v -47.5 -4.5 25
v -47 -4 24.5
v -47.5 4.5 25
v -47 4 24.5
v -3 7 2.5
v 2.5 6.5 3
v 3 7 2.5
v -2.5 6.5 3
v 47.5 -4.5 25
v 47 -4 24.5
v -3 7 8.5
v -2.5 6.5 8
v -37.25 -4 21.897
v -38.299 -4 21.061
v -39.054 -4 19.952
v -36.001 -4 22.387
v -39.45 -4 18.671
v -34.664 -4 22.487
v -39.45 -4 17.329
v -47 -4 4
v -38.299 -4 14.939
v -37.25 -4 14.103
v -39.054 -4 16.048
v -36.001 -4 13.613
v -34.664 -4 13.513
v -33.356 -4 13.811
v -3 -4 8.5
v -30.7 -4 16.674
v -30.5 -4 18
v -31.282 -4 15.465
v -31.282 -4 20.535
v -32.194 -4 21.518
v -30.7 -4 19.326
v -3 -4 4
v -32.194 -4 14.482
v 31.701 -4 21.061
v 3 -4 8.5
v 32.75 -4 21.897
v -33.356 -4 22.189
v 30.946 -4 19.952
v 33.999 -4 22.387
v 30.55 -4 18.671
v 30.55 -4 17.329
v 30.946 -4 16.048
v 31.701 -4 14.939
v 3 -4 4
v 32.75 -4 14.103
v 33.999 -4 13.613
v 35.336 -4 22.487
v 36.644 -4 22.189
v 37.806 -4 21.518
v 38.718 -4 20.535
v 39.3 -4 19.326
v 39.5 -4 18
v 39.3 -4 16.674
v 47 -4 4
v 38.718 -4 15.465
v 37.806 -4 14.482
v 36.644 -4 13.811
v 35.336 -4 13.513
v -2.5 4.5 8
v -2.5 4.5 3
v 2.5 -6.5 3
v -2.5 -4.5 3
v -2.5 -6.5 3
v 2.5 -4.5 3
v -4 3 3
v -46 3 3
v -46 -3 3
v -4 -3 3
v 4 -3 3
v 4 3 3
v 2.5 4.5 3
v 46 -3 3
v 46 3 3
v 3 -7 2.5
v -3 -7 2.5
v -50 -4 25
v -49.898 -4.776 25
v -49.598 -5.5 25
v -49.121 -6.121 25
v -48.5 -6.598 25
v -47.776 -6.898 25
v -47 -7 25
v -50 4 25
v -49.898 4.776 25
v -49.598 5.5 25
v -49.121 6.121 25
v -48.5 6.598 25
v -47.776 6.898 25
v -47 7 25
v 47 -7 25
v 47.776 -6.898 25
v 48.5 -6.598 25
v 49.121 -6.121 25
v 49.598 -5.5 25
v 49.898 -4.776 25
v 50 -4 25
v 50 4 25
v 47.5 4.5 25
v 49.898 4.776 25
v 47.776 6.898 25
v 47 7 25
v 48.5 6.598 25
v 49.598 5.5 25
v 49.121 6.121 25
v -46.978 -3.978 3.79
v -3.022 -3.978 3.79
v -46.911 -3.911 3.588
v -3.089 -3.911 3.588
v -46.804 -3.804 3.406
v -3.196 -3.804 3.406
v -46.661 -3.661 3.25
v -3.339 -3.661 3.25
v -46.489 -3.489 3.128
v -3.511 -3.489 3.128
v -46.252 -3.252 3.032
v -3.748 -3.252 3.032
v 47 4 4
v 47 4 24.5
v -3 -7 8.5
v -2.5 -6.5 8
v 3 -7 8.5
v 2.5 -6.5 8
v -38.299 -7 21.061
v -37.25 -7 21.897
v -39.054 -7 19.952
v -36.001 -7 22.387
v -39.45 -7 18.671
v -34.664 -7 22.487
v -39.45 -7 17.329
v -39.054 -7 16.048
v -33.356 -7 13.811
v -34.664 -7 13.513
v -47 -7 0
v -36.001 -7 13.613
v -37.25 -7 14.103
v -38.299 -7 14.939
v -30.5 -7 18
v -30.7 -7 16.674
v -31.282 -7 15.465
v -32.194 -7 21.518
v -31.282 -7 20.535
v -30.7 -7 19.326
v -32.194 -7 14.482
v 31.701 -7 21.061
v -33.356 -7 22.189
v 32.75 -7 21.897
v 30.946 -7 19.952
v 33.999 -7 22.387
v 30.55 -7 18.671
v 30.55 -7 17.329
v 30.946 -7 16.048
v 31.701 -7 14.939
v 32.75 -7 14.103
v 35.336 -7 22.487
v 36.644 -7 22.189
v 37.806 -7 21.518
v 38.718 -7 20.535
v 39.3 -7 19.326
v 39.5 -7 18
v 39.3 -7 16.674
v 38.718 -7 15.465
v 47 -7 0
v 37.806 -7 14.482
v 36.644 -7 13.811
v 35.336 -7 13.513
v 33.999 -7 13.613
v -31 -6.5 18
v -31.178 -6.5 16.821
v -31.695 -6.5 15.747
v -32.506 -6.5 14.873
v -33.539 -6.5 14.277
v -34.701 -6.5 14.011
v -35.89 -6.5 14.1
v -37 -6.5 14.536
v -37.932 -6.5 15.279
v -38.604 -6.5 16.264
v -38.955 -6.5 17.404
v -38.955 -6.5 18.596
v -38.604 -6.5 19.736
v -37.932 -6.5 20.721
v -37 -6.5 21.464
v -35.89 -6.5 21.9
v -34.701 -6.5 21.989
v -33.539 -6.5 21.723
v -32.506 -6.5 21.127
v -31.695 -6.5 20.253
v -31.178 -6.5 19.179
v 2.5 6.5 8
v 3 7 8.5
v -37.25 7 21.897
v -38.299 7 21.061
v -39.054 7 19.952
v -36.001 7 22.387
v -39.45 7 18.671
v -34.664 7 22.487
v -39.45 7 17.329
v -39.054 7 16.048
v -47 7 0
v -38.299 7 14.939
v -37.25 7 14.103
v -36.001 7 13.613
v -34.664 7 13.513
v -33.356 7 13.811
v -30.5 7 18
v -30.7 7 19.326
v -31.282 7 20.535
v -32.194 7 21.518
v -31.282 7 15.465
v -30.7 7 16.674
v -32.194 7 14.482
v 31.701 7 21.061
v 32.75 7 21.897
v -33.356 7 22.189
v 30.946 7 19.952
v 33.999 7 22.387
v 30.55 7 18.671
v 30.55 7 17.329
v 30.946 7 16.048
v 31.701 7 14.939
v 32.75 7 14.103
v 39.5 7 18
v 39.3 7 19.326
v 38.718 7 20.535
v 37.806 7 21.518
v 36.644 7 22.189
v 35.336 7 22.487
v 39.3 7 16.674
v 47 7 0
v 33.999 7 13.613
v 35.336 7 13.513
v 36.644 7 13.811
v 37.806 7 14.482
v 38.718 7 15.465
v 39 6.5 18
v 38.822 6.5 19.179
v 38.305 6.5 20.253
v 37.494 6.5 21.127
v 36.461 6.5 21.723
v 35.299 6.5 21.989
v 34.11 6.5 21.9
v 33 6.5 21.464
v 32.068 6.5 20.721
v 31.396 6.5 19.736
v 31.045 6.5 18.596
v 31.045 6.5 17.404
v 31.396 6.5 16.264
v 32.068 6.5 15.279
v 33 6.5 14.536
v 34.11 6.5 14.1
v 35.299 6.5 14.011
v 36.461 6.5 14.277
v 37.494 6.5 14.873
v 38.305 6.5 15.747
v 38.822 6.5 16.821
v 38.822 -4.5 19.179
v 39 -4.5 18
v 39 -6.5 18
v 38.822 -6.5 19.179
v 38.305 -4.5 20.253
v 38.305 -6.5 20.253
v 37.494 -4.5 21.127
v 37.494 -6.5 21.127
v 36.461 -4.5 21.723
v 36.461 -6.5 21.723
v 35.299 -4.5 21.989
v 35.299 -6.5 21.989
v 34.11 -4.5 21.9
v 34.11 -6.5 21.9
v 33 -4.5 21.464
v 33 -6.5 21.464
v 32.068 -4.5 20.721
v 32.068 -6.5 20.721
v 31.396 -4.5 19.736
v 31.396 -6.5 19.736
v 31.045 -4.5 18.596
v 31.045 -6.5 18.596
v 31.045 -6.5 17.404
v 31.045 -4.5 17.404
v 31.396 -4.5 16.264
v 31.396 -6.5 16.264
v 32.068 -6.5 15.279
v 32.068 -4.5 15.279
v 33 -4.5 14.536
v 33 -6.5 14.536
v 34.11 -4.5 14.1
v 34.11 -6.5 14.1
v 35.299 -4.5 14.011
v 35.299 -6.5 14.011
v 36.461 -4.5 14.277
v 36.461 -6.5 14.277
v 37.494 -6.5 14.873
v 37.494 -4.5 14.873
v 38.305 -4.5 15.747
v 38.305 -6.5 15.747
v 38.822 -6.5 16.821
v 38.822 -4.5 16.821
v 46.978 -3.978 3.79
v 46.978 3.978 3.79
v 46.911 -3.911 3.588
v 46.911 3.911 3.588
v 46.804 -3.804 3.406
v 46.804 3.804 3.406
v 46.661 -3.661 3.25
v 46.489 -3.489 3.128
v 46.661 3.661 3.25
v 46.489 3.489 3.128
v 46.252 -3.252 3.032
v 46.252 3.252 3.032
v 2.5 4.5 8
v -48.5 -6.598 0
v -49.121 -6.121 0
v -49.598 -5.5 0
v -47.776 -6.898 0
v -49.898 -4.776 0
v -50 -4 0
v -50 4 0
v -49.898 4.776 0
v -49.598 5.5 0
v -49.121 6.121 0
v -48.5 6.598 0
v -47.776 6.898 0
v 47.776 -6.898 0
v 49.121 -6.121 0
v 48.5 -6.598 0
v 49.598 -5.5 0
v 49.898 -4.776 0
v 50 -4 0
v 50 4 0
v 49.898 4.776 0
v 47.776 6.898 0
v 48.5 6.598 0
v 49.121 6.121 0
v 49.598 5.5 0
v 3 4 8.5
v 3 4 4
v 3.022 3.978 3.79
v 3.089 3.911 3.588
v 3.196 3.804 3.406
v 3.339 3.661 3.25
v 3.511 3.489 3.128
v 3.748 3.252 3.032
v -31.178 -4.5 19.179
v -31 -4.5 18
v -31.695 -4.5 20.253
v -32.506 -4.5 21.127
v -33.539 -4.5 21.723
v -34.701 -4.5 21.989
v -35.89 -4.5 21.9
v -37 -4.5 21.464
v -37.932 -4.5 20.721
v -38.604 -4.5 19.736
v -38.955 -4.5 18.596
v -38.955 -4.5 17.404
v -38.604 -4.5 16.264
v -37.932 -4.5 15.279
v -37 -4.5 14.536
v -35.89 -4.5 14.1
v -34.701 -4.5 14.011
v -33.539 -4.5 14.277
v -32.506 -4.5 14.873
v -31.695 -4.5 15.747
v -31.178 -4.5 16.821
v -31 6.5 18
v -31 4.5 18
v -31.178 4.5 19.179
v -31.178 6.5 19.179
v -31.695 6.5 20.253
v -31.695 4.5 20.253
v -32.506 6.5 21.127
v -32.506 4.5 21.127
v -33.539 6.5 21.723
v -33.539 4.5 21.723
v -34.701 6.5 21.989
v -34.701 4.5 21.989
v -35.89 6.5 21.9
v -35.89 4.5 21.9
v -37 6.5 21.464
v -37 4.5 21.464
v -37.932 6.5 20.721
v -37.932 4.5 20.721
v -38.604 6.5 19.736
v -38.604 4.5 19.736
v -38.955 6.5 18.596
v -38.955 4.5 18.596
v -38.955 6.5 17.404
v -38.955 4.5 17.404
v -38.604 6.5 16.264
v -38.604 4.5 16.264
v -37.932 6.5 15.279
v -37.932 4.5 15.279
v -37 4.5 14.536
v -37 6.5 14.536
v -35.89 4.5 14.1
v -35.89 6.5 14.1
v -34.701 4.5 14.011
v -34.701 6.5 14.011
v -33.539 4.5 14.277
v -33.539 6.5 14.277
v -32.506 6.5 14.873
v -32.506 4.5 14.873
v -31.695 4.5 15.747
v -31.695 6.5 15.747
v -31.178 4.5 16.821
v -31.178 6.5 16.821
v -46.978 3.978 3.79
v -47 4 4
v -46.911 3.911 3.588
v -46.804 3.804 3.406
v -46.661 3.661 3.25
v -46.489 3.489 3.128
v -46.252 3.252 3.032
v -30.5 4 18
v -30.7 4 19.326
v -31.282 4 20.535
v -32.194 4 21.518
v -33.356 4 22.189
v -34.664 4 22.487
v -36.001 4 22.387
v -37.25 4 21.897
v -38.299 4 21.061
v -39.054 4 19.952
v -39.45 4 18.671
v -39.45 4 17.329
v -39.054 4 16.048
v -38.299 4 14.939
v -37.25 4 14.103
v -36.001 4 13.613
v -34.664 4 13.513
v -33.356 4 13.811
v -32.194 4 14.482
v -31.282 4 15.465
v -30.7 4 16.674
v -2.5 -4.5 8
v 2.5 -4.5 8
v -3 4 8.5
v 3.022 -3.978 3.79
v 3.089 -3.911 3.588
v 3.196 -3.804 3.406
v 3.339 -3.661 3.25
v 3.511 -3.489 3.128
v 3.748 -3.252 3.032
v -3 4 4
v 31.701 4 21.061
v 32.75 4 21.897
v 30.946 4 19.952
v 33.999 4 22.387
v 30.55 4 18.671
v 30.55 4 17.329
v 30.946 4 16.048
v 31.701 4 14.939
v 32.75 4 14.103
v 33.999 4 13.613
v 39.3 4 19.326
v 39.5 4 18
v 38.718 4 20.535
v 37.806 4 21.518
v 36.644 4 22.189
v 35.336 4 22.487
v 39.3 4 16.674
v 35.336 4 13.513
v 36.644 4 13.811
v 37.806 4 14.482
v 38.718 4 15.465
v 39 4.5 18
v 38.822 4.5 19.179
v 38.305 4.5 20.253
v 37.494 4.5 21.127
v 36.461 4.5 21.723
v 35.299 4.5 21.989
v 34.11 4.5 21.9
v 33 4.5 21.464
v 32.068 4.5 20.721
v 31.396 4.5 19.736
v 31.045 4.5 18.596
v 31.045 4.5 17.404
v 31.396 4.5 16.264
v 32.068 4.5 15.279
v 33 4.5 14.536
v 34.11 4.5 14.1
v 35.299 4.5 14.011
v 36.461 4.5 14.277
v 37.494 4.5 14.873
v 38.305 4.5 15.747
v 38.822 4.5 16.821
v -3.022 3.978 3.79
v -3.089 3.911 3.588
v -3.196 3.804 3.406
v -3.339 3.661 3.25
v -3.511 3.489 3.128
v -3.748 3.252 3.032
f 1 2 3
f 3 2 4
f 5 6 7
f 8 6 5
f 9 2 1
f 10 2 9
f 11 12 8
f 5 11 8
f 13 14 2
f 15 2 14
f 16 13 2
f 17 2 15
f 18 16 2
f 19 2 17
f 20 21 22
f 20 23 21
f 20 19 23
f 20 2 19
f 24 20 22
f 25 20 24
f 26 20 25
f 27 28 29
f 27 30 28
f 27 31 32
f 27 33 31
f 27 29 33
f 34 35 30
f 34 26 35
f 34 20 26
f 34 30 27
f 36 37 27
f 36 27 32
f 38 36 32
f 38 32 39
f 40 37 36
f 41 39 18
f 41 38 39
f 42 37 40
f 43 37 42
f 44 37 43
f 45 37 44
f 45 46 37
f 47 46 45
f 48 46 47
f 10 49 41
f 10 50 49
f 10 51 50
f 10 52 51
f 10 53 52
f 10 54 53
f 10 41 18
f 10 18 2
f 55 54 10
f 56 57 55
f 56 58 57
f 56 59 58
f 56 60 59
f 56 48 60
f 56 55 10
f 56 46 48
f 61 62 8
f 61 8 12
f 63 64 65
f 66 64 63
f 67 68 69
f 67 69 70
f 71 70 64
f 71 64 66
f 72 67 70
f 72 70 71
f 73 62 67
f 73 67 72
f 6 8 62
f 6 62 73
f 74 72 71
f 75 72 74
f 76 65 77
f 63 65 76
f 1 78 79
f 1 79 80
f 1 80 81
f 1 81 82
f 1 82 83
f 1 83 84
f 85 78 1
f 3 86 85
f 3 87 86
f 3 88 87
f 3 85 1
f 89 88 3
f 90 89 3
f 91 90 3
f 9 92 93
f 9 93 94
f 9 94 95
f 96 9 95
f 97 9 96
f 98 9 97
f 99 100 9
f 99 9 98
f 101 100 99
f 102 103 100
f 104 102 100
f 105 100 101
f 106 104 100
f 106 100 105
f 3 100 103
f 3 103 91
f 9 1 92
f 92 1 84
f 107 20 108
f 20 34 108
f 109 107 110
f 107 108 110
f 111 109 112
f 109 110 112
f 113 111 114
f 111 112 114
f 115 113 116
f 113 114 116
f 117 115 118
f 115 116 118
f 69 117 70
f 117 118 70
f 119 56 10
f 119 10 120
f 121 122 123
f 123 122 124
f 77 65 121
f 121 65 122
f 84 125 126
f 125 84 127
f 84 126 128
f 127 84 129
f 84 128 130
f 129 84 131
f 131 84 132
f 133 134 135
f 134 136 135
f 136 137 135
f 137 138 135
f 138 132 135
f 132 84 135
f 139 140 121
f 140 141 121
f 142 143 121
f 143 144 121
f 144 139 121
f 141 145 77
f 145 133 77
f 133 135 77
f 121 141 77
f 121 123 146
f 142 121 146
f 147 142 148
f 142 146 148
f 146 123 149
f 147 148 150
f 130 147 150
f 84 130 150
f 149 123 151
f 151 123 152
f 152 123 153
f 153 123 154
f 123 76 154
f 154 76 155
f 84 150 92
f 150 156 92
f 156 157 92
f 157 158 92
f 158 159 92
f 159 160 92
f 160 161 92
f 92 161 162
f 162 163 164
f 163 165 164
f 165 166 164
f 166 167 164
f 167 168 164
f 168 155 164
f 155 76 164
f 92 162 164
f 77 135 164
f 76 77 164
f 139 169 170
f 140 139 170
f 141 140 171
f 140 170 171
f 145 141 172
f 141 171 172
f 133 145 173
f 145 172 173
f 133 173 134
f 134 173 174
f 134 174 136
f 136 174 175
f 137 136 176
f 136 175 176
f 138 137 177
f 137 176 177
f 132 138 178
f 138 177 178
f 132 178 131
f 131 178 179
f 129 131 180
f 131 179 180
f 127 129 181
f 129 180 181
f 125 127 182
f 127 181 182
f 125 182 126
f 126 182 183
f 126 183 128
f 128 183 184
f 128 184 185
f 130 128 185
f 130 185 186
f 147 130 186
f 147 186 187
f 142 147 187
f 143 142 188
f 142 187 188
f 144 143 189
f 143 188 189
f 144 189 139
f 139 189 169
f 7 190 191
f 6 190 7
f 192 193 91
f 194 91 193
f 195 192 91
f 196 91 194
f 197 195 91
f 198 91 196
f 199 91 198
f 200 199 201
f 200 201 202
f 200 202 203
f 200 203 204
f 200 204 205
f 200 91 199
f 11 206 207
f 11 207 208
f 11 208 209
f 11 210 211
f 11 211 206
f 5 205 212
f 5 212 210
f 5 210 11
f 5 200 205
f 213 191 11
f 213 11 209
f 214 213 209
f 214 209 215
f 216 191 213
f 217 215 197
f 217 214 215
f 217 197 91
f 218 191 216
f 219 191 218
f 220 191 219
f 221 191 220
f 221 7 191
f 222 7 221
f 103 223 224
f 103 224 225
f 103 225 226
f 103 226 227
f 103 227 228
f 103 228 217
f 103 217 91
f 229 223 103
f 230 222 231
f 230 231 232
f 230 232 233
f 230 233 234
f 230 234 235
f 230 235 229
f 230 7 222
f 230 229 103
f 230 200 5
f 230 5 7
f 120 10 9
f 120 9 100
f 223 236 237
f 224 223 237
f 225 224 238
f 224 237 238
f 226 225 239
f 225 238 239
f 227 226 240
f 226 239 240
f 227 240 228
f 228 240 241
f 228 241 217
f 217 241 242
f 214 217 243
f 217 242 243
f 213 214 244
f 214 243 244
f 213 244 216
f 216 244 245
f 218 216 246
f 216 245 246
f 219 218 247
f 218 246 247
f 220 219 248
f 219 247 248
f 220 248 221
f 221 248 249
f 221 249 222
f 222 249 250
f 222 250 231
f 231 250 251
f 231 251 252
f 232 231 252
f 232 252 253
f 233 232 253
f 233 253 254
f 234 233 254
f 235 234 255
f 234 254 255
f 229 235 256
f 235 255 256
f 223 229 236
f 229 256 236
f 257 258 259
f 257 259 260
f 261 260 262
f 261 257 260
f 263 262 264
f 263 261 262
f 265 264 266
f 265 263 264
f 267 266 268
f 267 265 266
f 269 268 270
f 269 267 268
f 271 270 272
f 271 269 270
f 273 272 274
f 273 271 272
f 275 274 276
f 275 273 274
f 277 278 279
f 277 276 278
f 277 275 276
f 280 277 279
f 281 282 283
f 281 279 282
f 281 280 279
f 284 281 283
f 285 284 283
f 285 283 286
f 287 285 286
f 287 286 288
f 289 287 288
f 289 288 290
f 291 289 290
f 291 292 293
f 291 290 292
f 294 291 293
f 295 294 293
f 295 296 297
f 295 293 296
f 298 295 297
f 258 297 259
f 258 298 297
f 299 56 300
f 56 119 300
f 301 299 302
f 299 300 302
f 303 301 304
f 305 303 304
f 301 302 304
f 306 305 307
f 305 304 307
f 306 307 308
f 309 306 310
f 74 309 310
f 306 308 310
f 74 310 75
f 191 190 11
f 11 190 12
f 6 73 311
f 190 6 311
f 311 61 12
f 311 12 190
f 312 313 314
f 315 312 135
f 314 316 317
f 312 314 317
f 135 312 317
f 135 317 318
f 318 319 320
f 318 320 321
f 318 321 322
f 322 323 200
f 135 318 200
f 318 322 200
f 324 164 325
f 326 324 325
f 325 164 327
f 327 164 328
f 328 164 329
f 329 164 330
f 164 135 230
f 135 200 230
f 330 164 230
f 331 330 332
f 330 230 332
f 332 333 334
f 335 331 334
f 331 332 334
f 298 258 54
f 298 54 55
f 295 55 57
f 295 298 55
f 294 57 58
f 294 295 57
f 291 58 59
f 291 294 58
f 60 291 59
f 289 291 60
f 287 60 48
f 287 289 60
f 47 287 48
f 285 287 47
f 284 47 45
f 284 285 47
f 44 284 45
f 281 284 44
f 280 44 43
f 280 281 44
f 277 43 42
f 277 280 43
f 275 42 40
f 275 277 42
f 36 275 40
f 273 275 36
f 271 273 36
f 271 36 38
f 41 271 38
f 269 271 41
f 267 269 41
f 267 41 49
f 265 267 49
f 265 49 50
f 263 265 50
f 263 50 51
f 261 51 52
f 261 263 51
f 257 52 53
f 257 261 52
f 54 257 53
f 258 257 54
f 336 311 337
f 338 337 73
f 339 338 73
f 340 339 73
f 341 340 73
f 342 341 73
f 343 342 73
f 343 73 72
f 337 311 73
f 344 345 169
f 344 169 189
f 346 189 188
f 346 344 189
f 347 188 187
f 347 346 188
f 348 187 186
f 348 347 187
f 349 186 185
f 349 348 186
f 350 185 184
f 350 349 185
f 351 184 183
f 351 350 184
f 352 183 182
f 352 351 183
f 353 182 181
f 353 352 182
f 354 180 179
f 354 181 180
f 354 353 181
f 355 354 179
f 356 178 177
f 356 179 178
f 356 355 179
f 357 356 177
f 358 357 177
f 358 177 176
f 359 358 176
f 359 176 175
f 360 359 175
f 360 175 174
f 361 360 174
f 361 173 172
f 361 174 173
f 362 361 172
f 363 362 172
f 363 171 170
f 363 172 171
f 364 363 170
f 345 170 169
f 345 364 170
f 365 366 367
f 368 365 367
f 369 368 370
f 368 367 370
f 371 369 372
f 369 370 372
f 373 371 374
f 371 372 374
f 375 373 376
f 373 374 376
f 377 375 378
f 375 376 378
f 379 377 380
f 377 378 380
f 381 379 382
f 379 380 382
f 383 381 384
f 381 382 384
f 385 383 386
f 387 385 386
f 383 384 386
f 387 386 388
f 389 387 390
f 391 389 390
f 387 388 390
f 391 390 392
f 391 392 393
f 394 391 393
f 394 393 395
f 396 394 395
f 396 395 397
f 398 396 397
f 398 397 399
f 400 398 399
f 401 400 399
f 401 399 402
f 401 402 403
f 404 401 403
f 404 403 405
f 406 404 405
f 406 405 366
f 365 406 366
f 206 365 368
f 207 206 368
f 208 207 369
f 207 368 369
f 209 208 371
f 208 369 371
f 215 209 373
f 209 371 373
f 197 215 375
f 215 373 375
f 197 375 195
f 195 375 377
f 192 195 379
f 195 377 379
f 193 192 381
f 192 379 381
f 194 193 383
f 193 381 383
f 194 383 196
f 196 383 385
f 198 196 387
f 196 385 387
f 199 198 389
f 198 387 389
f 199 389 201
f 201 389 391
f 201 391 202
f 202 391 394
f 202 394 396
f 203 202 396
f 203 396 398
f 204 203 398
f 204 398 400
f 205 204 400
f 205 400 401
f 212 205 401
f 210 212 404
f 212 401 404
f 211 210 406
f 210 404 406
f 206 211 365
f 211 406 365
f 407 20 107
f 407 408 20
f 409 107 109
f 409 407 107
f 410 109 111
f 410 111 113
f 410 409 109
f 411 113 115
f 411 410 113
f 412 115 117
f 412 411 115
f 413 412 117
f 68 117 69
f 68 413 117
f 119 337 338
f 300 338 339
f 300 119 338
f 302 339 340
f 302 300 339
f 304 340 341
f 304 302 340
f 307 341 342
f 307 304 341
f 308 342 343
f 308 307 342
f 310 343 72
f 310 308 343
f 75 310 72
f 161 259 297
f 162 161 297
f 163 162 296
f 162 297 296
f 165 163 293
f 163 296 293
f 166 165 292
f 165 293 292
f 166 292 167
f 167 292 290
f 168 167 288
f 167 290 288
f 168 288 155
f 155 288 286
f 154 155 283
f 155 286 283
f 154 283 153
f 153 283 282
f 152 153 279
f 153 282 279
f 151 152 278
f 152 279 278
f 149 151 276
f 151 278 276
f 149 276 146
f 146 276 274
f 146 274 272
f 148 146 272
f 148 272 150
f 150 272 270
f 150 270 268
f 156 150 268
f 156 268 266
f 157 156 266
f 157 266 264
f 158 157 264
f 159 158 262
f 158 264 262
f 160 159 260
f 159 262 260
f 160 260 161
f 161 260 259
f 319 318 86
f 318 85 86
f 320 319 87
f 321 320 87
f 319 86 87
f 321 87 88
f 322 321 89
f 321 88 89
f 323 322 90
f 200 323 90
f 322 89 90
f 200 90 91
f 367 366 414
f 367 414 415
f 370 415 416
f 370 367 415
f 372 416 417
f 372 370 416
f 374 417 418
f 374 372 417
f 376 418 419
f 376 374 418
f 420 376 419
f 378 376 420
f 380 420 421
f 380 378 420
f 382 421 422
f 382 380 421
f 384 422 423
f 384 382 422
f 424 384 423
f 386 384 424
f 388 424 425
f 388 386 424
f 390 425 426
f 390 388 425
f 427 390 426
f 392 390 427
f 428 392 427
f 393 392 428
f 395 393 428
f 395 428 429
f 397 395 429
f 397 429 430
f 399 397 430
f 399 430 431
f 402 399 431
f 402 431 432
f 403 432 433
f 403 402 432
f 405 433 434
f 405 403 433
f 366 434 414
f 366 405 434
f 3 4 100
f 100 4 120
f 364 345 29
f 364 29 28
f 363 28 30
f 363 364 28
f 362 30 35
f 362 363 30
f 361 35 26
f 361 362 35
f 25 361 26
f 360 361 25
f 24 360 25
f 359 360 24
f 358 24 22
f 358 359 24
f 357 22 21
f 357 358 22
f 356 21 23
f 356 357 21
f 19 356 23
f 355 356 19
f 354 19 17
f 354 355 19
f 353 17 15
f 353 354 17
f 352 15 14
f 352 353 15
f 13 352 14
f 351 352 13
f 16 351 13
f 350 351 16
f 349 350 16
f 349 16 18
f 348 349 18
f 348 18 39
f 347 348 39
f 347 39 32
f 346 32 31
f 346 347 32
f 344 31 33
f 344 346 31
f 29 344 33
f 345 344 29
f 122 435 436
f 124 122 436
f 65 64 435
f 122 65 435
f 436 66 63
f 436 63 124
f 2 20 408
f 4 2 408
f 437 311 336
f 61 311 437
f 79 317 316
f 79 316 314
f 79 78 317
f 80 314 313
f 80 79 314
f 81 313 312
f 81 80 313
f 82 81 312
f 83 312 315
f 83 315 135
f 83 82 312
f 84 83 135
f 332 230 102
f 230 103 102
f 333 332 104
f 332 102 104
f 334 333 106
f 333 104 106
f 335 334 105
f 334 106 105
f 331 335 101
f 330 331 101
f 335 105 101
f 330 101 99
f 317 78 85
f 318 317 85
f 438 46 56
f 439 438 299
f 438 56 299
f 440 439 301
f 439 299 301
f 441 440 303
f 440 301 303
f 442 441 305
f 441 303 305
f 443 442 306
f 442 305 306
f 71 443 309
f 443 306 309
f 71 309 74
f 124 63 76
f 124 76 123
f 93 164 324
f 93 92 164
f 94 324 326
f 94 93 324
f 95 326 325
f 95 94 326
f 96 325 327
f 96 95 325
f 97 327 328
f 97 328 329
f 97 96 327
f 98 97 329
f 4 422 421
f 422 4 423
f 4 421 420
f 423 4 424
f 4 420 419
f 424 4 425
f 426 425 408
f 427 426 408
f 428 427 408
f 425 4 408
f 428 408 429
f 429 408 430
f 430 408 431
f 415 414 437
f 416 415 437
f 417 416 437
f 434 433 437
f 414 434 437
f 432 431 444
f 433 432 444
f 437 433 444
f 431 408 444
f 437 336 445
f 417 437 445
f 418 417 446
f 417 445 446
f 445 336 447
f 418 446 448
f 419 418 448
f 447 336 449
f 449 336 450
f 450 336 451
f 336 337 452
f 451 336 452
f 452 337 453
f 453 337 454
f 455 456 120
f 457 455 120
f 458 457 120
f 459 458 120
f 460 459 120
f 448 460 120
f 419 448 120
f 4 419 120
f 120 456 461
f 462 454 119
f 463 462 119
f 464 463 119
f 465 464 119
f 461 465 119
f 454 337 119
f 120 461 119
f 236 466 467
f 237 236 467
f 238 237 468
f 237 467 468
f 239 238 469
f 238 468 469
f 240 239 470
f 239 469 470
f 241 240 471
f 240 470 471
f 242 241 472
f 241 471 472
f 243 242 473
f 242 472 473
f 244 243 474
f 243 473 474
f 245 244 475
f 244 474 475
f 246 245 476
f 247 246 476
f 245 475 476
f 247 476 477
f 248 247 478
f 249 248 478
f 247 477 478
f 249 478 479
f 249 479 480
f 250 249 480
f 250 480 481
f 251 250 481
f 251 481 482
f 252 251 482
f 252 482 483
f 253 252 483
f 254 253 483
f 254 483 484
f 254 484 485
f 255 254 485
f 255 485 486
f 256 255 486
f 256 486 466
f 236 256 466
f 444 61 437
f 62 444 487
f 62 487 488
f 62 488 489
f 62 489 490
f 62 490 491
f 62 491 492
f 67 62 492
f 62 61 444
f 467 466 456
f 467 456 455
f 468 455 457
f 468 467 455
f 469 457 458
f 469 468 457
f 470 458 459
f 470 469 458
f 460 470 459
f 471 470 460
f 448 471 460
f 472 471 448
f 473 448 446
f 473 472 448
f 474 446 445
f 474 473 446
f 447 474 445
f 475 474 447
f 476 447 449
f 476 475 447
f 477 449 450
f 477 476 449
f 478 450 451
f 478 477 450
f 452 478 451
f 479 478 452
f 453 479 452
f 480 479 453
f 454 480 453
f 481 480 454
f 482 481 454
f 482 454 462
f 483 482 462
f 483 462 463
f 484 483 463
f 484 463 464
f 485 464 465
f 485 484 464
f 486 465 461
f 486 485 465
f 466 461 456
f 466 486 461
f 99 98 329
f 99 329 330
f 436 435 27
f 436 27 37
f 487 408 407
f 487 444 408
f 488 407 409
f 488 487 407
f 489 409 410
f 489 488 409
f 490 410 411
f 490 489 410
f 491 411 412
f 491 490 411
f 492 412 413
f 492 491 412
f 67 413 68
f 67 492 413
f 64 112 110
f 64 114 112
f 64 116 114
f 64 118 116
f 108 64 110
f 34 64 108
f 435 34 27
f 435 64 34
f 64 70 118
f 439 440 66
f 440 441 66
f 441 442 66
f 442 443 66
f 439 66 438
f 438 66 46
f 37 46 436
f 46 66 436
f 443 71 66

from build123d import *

# Parameters (mm, degrees)
F0_W          = 100
F0_H          = 14
F1_DEPTH      = 25
F2_T          = -3
F3_R          = 4
F3_W          = 5
F3_H          = 5
F4_DEPTH      = 7.001
F4_DEPTH_BACK = 7.001
F5_R          = 3
F6_SIZE       = 0.5
F7_R          = 1


with BuildPart() as f1:
    # F0 (on Top) → F1 (new body)
    with BuildSketch(Plane.XY):
        Rectangle(F0_W, F0_H)
    extrude(amount=F1_DEPTH)

    # F2
    f2_openings = [f1.faces().sort_by_distance(p)[0] for p in [
        (0, 0, 25),
    ]]
    offset(amount=F2_T, openings=f2_openings)

    # F3 (on Front) → F4 (cut, two sides)
    with BuildSketch(Plane.XZ) as f4_sk:
        with Locations((-35, 18)):
            Circle(F3_R)
        with Locations((35, 18)):
            Circle(F3_R)
        with Locations((0, 5.5)):
            Rectangle(F3_W, F3_H)
    extrude(amount=-F4_DEPTH, mode=Mode.SUBTRACT)
    extrude(f4_sk.sketch, amount=F4_DEPTH_BACK, mode=Mode.SUBTRACT)

    # F5
    f5_edges = [f1.edges().sort_by_distance(p)[0] for p in [
        (-50, -7, 12.5),
        (50, -7, 12.5),
        (50, 7, 12.5),
        (-50, 7, 12.5),
    ]]
    fillet(f5_edges, radius=F5_R)

    # F6
    f6_edges = [f1.edges().sort_by_distance(p)[0] for p in [
        (0, 4, 25),
        (0, -4, 25),
        (-47, 0, 25),
        (47, 0, 25),
        (31, 7, 18),
        (39, 5.5, 18),
        (31, 4, 18),
        (31, -4, 18),
        (39, -5.5, 18),
        (31, -7, 18),
        (-39, 7, 18),
        (-31, 5.5, 18),
        (-39, 4, 18),
        (-39, -4, 18),
        (-31, -5.5, 18),
        (-39, -7, 18),
        (-2.5, -4, 5.5),
        (0, -4, 8),
        (2.5, -4, 5.5),
        (-2.5, 4, 5.5),
        (0, 4, 8),
        (2.5, 4, 5.5),
        (-2.5, -7, 5.5),
        (0, -7, 8),
        (2.5, -7, 5.5),
        (0, -7, 3),
        (2.5, 7, 5.5),
        (0, 7, 8),
        (-2.5, 7, 5.5),
        (0, 7, 3),
    ]]
    chamfer(f6_edges, length=F6_SIZE)

    # F7
    f7_edges = [f1.edges().sort_by_distance(p)[0] for p in [
        (-25, 4, 3),
        (-47, 0, 3),
        (-25, -4, 3),
        (25, -4, 3),
        (47, 0, 3),
        (25, 4, 3),
    ]]
    fillet(f7_edges, radius=F7_R)


solid = f1.part
